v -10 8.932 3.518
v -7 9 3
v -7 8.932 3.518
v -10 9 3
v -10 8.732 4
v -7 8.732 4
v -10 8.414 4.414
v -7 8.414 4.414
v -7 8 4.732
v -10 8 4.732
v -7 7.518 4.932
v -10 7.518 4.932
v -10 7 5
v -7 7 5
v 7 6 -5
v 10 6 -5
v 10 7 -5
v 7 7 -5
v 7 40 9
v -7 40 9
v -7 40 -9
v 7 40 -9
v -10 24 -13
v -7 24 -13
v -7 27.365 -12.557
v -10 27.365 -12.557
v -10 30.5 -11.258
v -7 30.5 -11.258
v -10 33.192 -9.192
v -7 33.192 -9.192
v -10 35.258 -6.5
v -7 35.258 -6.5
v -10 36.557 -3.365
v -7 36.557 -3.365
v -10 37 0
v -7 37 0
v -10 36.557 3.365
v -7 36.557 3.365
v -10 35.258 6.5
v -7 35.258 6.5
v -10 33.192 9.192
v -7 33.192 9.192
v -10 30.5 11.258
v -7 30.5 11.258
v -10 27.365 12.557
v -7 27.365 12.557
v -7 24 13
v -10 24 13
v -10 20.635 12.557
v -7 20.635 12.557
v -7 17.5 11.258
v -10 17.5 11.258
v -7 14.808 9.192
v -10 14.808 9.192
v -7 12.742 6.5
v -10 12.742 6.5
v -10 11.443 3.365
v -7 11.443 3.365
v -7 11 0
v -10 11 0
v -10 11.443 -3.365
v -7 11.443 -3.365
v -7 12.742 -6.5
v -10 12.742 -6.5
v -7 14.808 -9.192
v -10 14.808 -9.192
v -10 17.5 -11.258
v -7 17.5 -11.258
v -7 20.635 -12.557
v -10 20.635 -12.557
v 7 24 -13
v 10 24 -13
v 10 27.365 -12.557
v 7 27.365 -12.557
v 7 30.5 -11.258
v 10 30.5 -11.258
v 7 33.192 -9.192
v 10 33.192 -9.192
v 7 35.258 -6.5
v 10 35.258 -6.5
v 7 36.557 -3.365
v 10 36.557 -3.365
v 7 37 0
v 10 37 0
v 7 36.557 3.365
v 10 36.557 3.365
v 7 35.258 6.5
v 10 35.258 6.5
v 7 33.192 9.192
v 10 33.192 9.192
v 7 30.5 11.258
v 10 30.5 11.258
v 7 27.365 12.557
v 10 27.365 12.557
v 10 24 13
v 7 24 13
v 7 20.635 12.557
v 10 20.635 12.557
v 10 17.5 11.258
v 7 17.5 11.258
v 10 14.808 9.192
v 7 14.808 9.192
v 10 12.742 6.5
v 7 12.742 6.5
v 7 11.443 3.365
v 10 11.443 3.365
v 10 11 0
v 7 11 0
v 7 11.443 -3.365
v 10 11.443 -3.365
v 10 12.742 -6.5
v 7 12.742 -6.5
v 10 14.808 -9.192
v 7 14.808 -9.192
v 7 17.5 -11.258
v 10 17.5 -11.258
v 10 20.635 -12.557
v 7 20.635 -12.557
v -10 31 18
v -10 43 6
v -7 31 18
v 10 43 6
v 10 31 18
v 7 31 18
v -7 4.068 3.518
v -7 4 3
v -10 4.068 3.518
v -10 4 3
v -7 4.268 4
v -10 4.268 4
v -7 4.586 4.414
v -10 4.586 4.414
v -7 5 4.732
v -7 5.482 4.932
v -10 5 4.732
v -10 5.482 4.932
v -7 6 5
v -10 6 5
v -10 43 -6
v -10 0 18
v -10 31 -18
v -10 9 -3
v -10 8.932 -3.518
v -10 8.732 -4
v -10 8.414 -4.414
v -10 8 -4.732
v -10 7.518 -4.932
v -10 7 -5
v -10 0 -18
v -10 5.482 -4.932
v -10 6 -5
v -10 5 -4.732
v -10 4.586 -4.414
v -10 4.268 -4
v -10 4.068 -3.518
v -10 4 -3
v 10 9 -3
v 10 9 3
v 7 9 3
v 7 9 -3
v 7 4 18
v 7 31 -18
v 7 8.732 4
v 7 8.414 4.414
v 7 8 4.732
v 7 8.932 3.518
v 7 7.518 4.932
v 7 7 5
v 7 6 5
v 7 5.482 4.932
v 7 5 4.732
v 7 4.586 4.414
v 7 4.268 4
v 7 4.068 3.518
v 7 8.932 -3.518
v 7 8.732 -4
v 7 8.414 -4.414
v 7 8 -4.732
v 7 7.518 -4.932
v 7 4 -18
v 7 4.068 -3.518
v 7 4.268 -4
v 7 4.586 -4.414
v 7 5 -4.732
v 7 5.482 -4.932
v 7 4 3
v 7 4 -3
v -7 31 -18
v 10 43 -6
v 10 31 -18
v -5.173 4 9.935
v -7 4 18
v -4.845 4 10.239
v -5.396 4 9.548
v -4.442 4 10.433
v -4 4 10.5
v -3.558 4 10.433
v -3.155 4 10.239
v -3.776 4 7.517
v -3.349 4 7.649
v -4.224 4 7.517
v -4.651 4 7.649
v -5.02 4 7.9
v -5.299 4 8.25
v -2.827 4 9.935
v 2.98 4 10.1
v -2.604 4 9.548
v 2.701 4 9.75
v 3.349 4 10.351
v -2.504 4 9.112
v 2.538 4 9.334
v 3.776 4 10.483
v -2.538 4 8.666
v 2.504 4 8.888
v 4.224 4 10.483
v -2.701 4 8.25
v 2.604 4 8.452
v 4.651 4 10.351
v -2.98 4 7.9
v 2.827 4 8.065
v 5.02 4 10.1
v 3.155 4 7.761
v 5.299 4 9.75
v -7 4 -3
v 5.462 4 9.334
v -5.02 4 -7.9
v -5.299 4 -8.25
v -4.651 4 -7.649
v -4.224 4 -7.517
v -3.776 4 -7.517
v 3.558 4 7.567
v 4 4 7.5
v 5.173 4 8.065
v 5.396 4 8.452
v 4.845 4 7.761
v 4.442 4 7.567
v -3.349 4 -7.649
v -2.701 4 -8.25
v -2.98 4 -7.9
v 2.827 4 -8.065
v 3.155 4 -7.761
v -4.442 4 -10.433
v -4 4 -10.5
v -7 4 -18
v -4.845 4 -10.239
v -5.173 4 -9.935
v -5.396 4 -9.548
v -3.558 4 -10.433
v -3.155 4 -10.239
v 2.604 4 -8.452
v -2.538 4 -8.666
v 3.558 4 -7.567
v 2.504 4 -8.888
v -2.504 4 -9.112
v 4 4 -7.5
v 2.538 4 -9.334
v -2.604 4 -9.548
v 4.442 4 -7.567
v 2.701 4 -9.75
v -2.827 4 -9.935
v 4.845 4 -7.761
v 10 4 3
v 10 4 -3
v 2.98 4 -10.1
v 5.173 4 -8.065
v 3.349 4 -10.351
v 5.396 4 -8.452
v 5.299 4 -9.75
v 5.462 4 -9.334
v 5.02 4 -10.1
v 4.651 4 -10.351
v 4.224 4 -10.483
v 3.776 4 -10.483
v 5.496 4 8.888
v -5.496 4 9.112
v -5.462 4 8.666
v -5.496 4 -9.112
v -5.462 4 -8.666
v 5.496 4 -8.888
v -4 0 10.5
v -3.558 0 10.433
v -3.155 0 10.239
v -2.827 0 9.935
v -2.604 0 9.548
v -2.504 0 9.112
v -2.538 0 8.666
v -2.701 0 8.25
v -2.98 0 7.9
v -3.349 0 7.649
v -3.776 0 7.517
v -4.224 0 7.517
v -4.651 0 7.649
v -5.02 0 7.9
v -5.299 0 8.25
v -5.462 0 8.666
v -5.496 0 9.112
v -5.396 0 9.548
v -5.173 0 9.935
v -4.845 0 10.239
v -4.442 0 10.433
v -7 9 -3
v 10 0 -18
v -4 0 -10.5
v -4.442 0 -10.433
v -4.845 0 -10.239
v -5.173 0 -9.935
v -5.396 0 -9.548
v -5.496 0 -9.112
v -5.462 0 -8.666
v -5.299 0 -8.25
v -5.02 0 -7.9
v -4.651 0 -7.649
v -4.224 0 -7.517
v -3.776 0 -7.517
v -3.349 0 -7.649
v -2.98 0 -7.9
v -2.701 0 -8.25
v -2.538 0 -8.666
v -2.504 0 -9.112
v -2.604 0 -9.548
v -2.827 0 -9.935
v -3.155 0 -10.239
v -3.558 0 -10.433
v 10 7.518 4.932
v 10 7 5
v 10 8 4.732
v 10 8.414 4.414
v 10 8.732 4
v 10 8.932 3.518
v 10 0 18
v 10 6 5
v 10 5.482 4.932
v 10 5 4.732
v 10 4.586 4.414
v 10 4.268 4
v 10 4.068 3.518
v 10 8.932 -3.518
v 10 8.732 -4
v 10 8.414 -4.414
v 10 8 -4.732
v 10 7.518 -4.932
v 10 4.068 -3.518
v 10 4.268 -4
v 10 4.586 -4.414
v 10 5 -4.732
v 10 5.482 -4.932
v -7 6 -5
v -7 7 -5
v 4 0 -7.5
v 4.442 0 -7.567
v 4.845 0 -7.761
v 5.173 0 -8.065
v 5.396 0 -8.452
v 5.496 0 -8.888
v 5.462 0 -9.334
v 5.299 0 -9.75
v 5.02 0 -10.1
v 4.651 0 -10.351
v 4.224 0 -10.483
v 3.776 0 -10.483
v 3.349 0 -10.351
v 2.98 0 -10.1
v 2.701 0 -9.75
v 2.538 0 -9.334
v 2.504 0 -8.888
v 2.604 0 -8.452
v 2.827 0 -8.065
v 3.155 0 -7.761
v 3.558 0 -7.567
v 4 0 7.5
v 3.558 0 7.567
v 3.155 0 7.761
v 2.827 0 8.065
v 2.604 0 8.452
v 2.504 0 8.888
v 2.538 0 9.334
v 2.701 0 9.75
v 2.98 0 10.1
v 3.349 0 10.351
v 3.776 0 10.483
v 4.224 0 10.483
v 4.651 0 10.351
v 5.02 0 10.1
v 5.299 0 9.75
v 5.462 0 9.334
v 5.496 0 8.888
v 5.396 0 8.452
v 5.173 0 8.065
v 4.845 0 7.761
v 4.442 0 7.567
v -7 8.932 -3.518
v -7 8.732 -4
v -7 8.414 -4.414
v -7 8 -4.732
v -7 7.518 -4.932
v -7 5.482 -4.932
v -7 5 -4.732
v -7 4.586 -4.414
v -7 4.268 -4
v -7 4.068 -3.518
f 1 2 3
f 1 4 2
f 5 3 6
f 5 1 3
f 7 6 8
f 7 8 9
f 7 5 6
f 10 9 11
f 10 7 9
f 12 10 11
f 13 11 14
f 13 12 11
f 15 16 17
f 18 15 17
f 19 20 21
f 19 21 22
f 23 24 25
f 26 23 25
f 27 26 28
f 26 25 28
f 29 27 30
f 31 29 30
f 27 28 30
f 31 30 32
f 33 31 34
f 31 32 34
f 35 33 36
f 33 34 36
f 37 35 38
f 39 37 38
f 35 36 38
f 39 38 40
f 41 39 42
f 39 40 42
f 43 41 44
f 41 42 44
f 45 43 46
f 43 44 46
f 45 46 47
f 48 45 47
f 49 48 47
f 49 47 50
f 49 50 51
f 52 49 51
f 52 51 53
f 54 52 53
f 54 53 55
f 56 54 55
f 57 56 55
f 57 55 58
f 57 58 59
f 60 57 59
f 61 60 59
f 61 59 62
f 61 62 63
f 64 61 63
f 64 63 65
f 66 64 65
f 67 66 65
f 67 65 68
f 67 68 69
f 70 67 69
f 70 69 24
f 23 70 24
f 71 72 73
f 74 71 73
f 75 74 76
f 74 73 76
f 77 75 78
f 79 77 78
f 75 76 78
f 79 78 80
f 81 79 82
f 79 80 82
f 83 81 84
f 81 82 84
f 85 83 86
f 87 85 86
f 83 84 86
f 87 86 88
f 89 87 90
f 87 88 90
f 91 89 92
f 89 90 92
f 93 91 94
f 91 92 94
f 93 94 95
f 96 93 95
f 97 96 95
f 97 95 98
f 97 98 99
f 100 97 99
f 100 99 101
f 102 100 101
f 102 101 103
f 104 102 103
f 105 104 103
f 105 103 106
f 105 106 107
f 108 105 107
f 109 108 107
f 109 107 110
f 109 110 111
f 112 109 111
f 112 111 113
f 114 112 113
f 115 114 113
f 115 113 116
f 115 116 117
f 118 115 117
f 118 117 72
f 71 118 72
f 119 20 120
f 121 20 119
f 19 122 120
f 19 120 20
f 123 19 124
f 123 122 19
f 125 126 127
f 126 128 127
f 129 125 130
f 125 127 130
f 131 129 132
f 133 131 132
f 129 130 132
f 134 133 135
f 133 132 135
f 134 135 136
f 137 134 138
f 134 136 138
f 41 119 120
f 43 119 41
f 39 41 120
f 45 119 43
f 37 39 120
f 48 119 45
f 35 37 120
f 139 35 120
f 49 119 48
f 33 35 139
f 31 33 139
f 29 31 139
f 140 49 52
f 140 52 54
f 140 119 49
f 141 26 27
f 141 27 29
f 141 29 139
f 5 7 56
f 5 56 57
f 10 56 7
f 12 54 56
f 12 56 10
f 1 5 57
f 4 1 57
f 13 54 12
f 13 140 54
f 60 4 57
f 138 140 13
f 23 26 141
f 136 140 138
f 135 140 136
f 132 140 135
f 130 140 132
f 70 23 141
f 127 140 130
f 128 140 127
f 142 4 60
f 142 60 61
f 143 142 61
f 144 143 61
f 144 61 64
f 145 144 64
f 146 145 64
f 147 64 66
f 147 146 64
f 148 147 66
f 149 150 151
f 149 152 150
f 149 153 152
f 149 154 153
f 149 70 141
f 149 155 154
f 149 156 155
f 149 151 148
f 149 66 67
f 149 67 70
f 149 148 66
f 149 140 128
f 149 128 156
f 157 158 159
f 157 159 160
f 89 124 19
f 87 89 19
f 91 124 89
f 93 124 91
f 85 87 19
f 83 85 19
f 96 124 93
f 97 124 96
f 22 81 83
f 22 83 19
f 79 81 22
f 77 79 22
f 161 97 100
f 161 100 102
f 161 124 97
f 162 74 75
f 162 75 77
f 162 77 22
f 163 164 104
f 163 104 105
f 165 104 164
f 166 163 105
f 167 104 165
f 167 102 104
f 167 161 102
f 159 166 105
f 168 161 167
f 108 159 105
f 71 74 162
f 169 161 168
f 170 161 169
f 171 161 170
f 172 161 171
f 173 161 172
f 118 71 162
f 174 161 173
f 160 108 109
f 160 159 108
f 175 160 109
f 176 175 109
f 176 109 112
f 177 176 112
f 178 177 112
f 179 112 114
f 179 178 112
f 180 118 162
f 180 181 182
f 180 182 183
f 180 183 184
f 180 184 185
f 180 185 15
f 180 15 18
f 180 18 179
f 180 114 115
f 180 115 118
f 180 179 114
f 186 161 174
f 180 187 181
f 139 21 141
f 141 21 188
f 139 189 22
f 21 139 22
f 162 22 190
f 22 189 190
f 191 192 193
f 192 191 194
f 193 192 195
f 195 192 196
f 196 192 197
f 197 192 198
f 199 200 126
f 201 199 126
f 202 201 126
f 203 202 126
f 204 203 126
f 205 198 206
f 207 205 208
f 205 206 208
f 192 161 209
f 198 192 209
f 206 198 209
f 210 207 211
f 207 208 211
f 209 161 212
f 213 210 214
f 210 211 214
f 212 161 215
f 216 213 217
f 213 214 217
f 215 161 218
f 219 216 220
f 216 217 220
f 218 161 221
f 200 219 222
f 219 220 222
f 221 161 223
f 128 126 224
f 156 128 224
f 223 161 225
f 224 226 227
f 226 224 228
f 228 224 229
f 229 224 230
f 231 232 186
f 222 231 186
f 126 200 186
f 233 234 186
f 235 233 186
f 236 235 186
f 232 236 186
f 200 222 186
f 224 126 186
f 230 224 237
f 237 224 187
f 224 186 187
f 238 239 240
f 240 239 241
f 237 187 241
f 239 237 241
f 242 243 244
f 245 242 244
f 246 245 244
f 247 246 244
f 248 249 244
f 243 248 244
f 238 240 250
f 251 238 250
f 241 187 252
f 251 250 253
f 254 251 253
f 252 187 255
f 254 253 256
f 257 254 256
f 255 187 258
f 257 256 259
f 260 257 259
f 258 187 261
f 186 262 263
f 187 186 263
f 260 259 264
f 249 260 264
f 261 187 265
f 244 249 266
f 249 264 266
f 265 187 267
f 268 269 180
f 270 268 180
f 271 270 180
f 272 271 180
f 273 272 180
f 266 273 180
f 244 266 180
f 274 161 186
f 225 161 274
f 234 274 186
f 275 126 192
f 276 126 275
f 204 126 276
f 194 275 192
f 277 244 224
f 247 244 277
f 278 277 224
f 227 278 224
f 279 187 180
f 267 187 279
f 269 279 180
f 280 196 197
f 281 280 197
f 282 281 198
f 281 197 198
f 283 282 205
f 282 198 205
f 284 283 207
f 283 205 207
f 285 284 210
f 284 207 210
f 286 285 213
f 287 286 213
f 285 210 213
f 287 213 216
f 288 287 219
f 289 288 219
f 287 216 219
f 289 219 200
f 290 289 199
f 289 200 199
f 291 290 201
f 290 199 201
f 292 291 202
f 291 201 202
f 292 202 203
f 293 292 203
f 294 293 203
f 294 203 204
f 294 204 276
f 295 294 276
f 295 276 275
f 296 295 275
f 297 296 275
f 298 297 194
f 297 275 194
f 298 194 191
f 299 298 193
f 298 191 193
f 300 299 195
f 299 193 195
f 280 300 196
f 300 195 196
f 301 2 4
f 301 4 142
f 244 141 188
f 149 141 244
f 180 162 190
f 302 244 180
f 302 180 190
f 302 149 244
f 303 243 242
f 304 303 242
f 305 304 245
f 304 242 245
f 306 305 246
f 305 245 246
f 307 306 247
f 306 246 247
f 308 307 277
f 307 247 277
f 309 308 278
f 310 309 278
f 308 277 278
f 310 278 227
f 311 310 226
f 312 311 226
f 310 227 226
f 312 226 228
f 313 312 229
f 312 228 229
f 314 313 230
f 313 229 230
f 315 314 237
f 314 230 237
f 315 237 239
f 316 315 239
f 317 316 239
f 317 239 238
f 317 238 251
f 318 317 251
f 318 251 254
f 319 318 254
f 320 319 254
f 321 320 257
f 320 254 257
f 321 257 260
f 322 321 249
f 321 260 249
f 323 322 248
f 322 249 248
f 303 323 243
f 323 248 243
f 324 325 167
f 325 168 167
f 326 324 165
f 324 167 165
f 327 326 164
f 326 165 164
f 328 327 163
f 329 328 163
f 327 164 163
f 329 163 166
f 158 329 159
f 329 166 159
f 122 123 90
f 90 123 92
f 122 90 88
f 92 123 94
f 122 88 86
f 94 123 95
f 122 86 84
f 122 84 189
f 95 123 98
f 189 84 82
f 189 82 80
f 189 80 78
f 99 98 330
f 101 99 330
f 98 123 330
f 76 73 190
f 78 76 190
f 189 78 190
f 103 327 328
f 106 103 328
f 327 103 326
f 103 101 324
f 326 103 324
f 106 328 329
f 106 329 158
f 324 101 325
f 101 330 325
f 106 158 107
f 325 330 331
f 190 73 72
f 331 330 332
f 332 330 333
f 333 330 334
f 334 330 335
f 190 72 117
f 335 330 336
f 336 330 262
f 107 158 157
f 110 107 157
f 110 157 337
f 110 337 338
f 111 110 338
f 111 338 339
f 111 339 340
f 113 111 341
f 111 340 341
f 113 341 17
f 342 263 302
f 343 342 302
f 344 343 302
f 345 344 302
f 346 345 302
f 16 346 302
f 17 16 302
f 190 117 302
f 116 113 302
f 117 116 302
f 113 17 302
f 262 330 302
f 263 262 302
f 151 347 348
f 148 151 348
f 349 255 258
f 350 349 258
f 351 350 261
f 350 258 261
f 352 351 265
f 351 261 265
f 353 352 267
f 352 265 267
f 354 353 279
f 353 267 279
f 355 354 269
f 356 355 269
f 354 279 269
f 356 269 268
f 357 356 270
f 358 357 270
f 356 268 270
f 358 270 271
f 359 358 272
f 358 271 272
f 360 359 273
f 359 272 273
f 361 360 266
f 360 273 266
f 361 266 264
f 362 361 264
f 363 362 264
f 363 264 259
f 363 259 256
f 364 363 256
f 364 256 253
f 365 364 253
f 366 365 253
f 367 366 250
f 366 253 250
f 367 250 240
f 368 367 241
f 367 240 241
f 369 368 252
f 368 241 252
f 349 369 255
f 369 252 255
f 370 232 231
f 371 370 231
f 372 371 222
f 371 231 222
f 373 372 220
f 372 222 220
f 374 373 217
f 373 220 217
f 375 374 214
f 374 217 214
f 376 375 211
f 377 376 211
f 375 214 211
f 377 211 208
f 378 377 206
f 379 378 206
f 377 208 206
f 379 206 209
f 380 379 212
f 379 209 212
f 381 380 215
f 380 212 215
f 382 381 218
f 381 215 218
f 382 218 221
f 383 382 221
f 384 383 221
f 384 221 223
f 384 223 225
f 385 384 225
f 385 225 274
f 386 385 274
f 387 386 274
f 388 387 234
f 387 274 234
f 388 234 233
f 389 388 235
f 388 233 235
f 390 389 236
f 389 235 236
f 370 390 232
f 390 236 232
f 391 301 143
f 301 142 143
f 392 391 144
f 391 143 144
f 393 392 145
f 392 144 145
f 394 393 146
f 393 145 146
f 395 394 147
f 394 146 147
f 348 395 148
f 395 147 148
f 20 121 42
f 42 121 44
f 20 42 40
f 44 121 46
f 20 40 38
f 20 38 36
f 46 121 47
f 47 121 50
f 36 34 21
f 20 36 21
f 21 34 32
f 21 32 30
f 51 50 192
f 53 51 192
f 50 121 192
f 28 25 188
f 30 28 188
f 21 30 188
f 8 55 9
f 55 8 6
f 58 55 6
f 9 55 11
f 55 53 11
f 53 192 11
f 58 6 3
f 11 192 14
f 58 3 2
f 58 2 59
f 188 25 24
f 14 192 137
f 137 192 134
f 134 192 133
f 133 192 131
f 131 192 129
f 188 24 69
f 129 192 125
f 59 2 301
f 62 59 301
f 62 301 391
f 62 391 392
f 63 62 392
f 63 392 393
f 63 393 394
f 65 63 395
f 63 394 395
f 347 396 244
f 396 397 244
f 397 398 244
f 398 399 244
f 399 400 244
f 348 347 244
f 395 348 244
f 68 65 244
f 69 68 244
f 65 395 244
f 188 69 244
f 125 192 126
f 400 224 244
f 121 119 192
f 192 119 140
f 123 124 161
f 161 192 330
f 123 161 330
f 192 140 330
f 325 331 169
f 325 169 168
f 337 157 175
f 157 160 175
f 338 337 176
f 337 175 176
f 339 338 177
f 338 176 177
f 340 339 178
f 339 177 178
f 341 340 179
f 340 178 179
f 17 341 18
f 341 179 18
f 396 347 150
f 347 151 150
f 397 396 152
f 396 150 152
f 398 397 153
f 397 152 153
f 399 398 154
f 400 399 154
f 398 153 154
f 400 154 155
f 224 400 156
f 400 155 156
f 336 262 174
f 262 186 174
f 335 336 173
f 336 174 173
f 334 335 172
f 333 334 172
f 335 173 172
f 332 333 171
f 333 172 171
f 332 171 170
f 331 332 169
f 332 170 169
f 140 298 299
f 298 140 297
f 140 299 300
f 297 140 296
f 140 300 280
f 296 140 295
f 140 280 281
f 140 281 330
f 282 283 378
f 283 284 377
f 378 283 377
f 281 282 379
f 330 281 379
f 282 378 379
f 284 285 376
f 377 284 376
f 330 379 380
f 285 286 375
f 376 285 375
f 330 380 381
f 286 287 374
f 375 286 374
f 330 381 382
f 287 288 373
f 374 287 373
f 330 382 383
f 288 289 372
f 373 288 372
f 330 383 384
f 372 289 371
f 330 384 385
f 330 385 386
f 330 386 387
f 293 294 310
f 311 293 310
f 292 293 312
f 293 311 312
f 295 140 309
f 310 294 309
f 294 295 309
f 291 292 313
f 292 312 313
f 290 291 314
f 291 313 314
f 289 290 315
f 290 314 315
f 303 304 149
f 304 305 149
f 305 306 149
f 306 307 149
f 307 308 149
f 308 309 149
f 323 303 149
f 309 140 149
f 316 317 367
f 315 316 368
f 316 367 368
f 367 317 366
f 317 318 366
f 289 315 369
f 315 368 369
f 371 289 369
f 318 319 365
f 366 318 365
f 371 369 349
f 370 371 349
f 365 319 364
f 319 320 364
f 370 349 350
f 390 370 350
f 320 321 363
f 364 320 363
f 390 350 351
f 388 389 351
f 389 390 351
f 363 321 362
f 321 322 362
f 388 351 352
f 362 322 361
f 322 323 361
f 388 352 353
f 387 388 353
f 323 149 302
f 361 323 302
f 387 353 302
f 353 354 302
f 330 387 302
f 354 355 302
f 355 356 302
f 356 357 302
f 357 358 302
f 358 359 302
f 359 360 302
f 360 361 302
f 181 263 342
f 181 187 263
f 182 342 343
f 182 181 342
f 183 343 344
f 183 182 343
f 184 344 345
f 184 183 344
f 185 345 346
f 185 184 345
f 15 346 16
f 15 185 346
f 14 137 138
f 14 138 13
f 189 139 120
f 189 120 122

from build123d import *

# Parameters (mm, degrees)
SKETCH_1_W          = 20
SKETCH_1_H          = 36
EXTRUDE_1_DEPTH     = 4
SKETCH_2_W          = 3
SKETCH_2_H          = 36
EXTRUDE_2_DEPTH     = 36
SKETCH_3_W          = 20
SKETCH_3_H          = 36
EXTRUDE_3_DEPTH     = 3
SKETCH_4_R          = 13
CUT_EXTRUDE_1_DEPTH = 51.724747412
CUT_EXTRUDE_2_DEPTH = 51.724747412
SKETCH_6_R          = 1.5
CUT_EXTRUDE_3_DEPTH = 4
SKETCH_7_W          = 10
SKETCH_7_H          = 5
CUT_EXTRUDE_4_DEPTH = 51.724747412
FILLET_1_R          = 2


with BuildPart() as part:
    # 草图1 → 凸台-拉伸1 (new body)
    with BuildSketch(Plane(origin=(0, 0, 0), x_dir=(1, 0, 0), z_dir=(0, 1, 0))):
        Rectangle(SKETCH_1_W, SKETCH_1_H)
    extrude(amount=EXTRUDE_1_DEPTH)

    # 草图2 → 凸台-拉伸2 (add)
    with BuildSketch(Plane(origin=(0, 4, 0), x_dir=(1, 0, 0), z_dir=(0, 1, 0))):
        with Locations((-8.5, 0)):
            Rectangle(SKETCH_2_W, SKETCH_2_H)
        with Locations((8.5, 0)):
            Rectangle(SKETCH_2_W, SKETCH_2_H)
    extrude(amount=EXTRUDE_2_DEPTH)

    # 草图3 → 凸台-拉伸3 (add)
    with BuildSketch(Plane(origin=(0, 40, 0), x_dir=(1, 0, 0), z_dir=(0, 1, 0))):
        Rectangle(SKETCH_3_W, SKETCH_3_H)
    extrude(amount=EXTRUDE_3_DEPTH)

    # 草图4 → 切除-拉伸1 (cut, through all)
    with BuildSketch(Plane(origin=(10, 0, 0), x_dir=(0, 0, -1), z_dir=(1, 0, 0))):
        with Locations((0, 24)):
            Circle(SKETCH_4_R)
    extrude(amount=-CUT_EXTRUDE_1_DEPTH, mode=Mode.SUBTRACT)

    # 草图5 → 切除-拉伸2 (cut, through all)
    with BuildSketch(Plane(origin=(10, 0, 0), x_dir=(0, 0, -1), z_dir=(1, 0, 0))):
        Polygon((-6, 43), (-18, 31), (-18, 43), align=None)
        Polygon((18, 31), (18, 43), (6, 43), align=None)
    extrude(amount=-CUT_EXTRUDE_2_DEPTH, mode=Mode.SUBTRACT)

    # 草图6 → 切除-拉伸3 (cut)
    with BuildSketch(Plane(origin=(0, 4, 0), x_dir=(1, 0, 0), z_dir=(0, 1, 0))):
        with Locations(Location((4, 9, 0), (0, 0, 270))):
            Circle(SKETCH_6_R)
        with Locations(Location((-4, 9, 0), (0, 0, 90))):
            Circle(SKETCH_6_R)
        with Locations(Location((4, -9, 0), (0, 0, 90))):
            Circle(SKETCH_6_R)
        with Locations(Location((-4, -9, 0), (0, 0, 270))):
            Circle(SKETCH_6_R)
    extrude(amount=-CUT_EXTRUDE_3_DEPTH, mode=Mode.SUBTRACT)

    # 草图7 → 切除-拉伸4 (cut, through all)
    with BuildSketch(Plane(origin=(10, 0, 0), x_dir=(0, 0, -1), z_dir=(1, 0, 0))):
        with Locations((0, 6.5)):
            Rectangle(SKETCH_7_W, SKETCH_7_H)
    extrude(amount=-CUT_EXTRUDE_4_DEPTH, mode=Mode.SUBTRACT)

    # 圆角1
    fillet_1_edges = [part.edges().sort_by_distance(p)[0] for p in [
        (-8.5, 4, 5),
        (8.5, 4, 5),
        (-8.5, 9, 5),
        (8.5, 9, 5),
        (-8.5, 9, -5),
        (8.5, 9, -5),
        (-8.5, 4, -5),
        (8.5, 4, -5),
    ]]
    fillet(fillet_1_edges, radius=FILLET_1_R)


solid = part.part
